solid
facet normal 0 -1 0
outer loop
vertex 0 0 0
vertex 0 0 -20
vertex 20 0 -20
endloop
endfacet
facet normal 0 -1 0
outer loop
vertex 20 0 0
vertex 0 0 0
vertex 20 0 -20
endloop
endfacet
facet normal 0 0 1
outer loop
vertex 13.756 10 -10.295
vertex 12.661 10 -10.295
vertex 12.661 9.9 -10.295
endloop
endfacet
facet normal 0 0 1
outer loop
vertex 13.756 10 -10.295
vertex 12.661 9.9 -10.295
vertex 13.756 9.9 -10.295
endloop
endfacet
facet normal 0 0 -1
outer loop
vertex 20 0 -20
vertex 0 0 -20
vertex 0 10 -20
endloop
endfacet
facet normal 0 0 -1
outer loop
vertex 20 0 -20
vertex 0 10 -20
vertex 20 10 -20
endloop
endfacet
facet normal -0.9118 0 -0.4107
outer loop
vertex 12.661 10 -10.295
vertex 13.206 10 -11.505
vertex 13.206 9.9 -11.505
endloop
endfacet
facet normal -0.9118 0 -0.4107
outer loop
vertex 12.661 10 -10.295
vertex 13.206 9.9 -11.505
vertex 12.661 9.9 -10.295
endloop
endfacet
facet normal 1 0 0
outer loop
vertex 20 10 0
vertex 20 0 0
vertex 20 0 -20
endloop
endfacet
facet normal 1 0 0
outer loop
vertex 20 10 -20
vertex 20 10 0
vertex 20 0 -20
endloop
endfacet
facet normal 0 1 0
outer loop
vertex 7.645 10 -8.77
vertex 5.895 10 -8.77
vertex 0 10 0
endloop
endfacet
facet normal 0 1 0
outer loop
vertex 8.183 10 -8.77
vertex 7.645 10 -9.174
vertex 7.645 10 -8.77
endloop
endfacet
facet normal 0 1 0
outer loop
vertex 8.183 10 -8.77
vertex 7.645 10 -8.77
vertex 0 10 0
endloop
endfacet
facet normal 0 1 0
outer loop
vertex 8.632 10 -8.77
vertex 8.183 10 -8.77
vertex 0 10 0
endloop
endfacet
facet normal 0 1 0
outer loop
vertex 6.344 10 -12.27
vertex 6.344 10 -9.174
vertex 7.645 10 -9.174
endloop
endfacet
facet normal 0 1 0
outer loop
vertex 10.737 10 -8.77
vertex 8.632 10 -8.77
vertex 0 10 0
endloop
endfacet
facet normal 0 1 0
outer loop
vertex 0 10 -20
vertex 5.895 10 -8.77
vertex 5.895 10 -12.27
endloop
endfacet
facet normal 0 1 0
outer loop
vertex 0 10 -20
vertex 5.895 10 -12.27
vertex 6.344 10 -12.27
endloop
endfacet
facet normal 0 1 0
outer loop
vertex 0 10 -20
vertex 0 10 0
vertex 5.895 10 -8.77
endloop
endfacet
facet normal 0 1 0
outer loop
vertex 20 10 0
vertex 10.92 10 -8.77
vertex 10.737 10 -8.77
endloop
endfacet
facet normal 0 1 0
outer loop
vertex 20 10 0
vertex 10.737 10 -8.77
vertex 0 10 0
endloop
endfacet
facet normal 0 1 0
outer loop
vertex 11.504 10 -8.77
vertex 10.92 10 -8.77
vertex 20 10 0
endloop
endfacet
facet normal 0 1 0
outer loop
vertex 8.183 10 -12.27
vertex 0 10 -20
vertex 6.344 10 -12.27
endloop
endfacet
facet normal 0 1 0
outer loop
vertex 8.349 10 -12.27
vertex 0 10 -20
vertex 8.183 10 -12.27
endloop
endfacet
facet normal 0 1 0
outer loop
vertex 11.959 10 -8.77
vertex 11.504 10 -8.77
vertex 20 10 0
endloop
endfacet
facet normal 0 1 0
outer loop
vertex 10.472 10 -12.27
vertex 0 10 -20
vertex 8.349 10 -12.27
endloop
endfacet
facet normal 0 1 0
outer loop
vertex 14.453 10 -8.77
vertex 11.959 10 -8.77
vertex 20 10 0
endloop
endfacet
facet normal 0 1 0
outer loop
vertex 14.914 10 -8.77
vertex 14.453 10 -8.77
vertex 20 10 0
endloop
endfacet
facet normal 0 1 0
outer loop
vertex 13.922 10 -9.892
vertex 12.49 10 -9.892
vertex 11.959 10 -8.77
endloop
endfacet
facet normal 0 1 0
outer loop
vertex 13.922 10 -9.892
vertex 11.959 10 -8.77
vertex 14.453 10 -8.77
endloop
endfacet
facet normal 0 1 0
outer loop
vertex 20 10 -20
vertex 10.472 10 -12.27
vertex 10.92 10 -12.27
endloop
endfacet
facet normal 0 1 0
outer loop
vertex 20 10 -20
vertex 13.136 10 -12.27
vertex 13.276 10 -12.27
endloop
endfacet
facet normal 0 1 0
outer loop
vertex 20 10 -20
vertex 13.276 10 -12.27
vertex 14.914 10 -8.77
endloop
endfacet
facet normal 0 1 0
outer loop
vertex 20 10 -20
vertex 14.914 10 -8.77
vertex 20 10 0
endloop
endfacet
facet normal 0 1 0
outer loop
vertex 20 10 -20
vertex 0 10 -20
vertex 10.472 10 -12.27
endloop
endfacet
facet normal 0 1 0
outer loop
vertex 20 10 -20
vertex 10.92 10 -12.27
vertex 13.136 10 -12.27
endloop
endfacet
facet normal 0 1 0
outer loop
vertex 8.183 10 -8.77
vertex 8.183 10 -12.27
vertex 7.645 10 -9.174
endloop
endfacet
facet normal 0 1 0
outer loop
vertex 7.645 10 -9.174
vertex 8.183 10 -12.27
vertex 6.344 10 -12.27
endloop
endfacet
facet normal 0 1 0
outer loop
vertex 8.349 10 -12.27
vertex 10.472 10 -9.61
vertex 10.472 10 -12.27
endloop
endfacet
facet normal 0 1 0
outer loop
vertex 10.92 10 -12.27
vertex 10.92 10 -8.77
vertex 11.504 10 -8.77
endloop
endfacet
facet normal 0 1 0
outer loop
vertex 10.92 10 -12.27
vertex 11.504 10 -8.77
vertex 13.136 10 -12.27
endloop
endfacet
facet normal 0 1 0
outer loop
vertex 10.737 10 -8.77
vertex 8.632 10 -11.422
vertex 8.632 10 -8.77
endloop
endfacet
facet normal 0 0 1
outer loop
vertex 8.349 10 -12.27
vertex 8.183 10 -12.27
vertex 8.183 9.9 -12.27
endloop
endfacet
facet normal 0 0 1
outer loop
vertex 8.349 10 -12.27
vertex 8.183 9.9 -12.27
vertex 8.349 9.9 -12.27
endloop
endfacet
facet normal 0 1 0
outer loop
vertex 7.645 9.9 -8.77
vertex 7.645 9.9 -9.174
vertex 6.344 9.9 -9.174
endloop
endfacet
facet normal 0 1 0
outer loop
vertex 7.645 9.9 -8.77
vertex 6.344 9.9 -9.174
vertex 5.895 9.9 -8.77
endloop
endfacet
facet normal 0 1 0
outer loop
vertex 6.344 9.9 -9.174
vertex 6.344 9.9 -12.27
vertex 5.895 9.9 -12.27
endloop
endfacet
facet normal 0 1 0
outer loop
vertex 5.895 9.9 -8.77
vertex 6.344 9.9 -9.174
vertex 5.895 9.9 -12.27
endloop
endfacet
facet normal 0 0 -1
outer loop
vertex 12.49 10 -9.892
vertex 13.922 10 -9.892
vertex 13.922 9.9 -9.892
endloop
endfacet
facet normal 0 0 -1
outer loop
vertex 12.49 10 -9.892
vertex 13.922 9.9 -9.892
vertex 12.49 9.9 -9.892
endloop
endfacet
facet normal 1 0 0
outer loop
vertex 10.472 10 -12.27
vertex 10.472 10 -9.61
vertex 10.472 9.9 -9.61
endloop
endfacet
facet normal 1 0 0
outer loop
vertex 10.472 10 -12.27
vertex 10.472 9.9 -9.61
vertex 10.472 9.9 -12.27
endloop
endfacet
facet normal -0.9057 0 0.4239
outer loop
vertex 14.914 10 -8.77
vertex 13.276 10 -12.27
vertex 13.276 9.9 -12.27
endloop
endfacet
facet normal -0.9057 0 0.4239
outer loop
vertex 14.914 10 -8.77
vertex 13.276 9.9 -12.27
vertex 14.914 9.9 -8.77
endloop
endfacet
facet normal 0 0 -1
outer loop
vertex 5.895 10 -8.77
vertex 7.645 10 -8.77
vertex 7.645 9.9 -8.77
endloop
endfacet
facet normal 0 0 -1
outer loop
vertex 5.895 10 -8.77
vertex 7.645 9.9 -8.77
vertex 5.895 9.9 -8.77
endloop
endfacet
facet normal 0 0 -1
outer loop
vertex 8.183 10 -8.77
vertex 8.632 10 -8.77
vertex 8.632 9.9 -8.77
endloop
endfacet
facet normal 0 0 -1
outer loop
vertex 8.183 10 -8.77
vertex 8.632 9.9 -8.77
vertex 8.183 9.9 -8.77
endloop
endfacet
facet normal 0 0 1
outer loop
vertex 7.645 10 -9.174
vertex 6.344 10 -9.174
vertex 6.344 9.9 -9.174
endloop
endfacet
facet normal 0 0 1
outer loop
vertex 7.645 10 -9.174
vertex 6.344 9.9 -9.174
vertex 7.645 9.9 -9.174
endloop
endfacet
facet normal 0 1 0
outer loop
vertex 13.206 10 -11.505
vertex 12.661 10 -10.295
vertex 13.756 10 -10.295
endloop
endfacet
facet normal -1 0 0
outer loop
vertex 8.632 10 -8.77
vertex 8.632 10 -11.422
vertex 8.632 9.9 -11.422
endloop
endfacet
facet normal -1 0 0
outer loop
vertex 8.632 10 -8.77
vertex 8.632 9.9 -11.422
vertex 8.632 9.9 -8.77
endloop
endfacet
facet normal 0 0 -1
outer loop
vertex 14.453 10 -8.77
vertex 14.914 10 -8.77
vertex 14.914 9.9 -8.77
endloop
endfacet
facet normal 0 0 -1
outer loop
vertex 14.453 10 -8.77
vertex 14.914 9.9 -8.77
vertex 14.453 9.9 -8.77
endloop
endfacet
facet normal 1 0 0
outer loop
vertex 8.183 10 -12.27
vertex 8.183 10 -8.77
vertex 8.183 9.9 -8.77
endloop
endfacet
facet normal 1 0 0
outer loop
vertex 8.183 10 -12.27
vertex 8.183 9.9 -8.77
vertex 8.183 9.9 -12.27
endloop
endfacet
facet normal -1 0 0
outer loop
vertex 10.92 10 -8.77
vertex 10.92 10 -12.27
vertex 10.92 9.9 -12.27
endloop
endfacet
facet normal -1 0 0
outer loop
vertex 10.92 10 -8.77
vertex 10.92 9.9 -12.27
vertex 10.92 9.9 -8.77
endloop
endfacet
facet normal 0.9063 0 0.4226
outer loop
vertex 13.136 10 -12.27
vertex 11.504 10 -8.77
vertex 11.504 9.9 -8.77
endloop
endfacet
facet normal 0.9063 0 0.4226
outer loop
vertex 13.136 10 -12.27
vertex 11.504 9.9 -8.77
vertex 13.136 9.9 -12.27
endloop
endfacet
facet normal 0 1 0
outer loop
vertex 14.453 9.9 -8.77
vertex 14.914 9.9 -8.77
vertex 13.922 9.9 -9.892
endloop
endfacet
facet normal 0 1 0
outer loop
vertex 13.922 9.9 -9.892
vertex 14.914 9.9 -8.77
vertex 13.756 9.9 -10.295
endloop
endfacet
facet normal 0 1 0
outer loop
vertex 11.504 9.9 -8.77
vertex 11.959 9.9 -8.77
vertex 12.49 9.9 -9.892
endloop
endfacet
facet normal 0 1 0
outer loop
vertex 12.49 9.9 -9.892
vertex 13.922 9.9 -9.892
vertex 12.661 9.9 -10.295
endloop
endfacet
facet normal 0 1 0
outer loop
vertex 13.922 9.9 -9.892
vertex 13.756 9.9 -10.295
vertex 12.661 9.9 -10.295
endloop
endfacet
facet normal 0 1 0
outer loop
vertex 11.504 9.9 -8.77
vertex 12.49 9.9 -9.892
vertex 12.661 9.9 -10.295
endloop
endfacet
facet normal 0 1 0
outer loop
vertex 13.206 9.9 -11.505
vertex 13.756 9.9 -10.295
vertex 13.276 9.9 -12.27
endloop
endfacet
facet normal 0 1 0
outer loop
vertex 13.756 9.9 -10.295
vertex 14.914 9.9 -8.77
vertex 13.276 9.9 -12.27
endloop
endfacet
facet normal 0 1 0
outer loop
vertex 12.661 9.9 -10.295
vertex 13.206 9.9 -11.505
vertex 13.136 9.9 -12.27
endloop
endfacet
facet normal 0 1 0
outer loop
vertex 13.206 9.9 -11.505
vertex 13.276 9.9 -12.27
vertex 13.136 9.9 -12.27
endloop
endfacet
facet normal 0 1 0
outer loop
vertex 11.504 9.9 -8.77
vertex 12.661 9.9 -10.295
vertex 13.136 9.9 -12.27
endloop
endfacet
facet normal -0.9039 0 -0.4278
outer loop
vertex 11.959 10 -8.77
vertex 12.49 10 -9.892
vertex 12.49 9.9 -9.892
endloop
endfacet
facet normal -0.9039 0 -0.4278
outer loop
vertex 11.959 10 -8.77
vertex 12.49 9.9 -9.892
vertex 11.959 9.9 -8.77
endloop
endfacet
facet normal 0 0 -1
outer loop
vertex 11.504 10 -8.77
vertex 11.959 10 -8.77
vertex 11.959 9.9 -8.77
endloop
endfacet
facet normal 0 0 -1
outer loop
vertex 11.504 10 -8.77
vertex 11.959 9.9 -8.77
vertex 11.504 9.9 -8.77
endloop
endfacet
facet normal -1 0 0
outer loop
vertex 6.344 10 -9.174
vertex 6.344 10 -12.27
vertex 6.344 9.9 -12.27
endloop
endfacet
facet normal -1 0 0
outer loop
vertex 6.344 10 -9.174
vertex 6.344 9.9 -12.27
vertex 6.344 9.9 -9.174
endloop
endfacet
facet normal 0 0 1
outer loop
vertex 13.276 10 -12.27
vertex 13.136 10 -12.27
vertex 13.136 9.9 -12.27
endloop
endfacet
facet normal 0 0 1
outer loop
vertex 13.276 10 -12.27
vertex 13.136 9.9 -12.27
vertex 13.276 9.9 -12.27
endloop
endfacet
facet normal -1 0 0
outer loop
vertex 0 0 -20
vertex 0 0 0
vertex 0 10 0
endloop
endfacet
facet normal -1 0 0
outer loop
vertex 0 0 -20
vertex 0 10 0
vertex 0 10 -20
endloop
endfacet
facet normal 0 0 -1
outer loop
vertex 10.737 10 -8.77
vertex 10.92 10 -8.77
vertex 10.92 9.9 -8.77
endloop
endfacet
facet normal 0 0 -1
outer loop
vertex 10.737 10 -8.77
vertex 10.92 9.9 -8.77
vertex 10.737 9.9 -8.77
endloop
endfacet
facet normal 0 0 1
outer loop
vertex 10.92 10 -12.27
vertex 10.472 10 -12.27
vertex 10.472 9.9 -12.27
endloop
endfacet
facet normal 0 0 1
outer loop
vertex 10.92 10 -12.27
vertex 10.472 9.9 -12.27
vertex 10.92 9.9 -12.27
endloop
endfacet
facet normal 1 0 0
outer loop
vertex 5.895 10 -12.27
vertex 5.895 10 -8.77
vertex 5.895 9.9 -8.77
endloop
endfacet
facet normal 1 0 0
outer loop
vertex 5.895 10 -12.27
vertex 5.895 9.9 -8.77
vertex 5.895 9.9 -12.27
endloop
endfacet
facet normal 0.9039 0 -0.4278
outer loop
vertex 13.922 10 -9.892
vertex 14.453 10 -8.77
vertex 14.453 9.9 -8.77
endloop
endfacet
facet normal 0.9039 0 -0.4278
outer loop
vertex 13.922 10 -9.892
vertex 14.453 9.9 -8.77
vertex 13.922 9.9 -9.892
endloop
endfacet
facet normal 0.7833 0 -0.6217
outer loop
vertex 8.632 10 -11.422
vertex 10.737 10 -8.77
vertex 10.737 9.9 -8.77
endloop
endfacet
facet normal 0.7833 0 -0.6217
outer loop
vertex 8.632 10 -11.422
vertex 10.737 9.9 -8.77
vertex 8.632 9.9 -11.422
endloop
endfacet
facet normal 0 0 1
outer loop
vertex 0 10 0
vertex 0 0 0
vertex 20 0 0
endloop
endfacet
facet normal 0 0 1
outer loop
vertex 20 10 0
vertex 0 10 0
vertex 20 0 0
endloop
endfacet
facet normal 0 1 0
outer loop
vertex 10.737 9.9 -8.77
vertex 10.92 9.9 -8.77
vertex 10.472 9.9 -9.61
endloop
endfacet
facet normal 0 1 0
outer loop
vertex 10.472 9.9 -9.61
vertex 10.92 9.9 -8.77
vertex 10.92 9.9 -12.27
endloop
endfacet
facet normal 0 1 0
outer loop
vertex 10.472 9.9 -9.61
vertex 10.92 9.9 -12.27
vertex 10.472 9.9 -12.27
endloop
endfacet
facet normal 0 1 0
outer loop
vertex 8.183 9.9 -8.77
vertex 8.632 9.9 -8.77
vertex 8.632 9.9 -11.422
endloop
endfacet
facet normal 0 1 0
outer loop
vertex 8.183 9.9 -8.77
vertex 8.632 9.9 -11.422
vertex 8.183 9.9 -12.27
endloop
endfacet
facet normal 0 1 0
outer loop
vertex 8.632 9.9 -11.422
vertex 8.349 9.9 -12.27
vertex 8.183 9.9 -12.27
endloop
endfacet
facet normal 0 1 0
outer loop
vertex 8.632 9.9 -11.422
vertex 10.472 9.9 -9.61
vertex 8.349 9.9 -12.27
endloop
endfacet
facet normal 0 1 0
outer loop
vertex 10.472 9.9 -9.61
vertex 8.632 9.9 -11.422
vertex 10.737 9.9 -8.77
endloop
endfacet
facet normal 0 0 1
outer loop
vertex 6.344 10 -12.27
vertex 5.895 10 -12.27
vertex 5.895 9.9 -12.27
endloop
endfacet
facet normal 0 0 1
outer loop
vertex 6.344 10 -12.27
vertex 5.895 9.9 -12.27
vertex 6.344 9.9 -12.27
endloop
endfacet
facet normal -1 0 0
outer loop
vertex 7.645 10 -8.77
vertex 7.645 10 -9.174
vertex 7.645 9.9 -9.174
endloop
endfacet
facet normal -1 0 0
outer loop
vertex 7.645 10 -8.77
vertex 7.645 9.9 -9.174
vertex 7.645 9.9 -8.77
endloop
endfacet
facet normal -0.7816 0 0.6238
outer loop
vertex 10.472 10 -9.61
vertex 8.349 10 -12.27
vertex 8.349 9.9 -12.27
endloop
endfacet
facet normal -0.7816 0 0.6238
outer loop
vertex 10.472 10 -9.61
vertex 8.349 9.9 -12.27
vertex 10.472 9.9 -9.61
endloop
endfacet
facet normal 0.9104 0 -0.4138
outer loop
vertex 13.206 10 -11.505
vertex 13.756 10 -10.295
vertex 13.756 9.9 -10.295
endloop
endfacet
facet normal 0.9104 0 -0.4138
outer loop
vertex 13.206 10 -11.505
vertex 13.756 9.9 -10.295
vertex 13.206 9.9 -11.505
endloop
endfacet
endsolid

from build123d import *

# Parameters (mm, degrees)
SKETCH1_W           = 20
SKETCH1_H           = 20
BOSS_EXTRUDE1_DEPTH = 10
CUT_EXTRUDE1_DEPTH  = 0.1


with BuildPart() as part:
    # Sketch1 → Boss-Extrude1 (new body)
    with BuildSketch(Plane(origin=(0, 0, 0), x_dir=(1, 0, 0), z_dir=(0, 1, 0))):
        with Locations((10, 10)):
            Rectangle(SKETCH1_W, SKETCH1_H)
    extrude(amount=BOSS_EXTRUDE1_DEPTH)

    # Sketch2 → Cut-Extrude1 (cut)
    # profile 1 of 3: a face of its own
    with BuildSketch(Plane(origin=(0, 10, 0), x_dir=(1, 0, 0), z_dir=(0, 1, 0))):
        Polygon((5.894809539, 12.269793042), (6.343527487, 12.269793042), (6.343527487, 9.173639196), (7.644809539, 9.173639196), (7.644809539, 8.769793042), (5.894809539, 8.769793042), align=None)
    # profile 2 of 3: a face of its own
    with BuildSketch(Plane(origin=(0, 10, 0), x_dir=(1, 0, 0), z_dir=(0, 1, 0))):
        Polygon((8.183271077, 8.769793042), (8.183271077, 12.269793042), (8.349436943, 12.269793042), (10.471732616, 9.610438074), (10.471732616, 12.269793042), (10.920450564, 12.269793042), (10.920450564, 8.769793042), (10.736756654, 8.769793042), (8.631989026, 11.422136792), (8.631989026, 8.769793042), align=None)
    # profile 3 of 3: a face of its own
    with BuildSketch(Plane(origin=(0, 10, 0), x_dir=(1, 0, 0), z_dir=(0, 1, 0))):
        Polygon((13.276219795, 12.269793042), (14.914040308, 8.769793042), (14.453403289, 8.769793042), (13.921952968, 9.891587914), (12.490262263, 9.891587914), (11.958811943, 8.769793042), (11.503783898, 8.769793042), (13.135995436, 12.269793042), align=None)
        Polygon((13.206107616, 11.504869164), (12.661335981, 10.295434068), (13.756488225, 10.295434068), align=None, mode=Mode.SUBTRACT)
    extrude(amount=-CUT_EXTRUDE1_DEPTH, mode=Mode.SUBTRACT)


solid = part.part
